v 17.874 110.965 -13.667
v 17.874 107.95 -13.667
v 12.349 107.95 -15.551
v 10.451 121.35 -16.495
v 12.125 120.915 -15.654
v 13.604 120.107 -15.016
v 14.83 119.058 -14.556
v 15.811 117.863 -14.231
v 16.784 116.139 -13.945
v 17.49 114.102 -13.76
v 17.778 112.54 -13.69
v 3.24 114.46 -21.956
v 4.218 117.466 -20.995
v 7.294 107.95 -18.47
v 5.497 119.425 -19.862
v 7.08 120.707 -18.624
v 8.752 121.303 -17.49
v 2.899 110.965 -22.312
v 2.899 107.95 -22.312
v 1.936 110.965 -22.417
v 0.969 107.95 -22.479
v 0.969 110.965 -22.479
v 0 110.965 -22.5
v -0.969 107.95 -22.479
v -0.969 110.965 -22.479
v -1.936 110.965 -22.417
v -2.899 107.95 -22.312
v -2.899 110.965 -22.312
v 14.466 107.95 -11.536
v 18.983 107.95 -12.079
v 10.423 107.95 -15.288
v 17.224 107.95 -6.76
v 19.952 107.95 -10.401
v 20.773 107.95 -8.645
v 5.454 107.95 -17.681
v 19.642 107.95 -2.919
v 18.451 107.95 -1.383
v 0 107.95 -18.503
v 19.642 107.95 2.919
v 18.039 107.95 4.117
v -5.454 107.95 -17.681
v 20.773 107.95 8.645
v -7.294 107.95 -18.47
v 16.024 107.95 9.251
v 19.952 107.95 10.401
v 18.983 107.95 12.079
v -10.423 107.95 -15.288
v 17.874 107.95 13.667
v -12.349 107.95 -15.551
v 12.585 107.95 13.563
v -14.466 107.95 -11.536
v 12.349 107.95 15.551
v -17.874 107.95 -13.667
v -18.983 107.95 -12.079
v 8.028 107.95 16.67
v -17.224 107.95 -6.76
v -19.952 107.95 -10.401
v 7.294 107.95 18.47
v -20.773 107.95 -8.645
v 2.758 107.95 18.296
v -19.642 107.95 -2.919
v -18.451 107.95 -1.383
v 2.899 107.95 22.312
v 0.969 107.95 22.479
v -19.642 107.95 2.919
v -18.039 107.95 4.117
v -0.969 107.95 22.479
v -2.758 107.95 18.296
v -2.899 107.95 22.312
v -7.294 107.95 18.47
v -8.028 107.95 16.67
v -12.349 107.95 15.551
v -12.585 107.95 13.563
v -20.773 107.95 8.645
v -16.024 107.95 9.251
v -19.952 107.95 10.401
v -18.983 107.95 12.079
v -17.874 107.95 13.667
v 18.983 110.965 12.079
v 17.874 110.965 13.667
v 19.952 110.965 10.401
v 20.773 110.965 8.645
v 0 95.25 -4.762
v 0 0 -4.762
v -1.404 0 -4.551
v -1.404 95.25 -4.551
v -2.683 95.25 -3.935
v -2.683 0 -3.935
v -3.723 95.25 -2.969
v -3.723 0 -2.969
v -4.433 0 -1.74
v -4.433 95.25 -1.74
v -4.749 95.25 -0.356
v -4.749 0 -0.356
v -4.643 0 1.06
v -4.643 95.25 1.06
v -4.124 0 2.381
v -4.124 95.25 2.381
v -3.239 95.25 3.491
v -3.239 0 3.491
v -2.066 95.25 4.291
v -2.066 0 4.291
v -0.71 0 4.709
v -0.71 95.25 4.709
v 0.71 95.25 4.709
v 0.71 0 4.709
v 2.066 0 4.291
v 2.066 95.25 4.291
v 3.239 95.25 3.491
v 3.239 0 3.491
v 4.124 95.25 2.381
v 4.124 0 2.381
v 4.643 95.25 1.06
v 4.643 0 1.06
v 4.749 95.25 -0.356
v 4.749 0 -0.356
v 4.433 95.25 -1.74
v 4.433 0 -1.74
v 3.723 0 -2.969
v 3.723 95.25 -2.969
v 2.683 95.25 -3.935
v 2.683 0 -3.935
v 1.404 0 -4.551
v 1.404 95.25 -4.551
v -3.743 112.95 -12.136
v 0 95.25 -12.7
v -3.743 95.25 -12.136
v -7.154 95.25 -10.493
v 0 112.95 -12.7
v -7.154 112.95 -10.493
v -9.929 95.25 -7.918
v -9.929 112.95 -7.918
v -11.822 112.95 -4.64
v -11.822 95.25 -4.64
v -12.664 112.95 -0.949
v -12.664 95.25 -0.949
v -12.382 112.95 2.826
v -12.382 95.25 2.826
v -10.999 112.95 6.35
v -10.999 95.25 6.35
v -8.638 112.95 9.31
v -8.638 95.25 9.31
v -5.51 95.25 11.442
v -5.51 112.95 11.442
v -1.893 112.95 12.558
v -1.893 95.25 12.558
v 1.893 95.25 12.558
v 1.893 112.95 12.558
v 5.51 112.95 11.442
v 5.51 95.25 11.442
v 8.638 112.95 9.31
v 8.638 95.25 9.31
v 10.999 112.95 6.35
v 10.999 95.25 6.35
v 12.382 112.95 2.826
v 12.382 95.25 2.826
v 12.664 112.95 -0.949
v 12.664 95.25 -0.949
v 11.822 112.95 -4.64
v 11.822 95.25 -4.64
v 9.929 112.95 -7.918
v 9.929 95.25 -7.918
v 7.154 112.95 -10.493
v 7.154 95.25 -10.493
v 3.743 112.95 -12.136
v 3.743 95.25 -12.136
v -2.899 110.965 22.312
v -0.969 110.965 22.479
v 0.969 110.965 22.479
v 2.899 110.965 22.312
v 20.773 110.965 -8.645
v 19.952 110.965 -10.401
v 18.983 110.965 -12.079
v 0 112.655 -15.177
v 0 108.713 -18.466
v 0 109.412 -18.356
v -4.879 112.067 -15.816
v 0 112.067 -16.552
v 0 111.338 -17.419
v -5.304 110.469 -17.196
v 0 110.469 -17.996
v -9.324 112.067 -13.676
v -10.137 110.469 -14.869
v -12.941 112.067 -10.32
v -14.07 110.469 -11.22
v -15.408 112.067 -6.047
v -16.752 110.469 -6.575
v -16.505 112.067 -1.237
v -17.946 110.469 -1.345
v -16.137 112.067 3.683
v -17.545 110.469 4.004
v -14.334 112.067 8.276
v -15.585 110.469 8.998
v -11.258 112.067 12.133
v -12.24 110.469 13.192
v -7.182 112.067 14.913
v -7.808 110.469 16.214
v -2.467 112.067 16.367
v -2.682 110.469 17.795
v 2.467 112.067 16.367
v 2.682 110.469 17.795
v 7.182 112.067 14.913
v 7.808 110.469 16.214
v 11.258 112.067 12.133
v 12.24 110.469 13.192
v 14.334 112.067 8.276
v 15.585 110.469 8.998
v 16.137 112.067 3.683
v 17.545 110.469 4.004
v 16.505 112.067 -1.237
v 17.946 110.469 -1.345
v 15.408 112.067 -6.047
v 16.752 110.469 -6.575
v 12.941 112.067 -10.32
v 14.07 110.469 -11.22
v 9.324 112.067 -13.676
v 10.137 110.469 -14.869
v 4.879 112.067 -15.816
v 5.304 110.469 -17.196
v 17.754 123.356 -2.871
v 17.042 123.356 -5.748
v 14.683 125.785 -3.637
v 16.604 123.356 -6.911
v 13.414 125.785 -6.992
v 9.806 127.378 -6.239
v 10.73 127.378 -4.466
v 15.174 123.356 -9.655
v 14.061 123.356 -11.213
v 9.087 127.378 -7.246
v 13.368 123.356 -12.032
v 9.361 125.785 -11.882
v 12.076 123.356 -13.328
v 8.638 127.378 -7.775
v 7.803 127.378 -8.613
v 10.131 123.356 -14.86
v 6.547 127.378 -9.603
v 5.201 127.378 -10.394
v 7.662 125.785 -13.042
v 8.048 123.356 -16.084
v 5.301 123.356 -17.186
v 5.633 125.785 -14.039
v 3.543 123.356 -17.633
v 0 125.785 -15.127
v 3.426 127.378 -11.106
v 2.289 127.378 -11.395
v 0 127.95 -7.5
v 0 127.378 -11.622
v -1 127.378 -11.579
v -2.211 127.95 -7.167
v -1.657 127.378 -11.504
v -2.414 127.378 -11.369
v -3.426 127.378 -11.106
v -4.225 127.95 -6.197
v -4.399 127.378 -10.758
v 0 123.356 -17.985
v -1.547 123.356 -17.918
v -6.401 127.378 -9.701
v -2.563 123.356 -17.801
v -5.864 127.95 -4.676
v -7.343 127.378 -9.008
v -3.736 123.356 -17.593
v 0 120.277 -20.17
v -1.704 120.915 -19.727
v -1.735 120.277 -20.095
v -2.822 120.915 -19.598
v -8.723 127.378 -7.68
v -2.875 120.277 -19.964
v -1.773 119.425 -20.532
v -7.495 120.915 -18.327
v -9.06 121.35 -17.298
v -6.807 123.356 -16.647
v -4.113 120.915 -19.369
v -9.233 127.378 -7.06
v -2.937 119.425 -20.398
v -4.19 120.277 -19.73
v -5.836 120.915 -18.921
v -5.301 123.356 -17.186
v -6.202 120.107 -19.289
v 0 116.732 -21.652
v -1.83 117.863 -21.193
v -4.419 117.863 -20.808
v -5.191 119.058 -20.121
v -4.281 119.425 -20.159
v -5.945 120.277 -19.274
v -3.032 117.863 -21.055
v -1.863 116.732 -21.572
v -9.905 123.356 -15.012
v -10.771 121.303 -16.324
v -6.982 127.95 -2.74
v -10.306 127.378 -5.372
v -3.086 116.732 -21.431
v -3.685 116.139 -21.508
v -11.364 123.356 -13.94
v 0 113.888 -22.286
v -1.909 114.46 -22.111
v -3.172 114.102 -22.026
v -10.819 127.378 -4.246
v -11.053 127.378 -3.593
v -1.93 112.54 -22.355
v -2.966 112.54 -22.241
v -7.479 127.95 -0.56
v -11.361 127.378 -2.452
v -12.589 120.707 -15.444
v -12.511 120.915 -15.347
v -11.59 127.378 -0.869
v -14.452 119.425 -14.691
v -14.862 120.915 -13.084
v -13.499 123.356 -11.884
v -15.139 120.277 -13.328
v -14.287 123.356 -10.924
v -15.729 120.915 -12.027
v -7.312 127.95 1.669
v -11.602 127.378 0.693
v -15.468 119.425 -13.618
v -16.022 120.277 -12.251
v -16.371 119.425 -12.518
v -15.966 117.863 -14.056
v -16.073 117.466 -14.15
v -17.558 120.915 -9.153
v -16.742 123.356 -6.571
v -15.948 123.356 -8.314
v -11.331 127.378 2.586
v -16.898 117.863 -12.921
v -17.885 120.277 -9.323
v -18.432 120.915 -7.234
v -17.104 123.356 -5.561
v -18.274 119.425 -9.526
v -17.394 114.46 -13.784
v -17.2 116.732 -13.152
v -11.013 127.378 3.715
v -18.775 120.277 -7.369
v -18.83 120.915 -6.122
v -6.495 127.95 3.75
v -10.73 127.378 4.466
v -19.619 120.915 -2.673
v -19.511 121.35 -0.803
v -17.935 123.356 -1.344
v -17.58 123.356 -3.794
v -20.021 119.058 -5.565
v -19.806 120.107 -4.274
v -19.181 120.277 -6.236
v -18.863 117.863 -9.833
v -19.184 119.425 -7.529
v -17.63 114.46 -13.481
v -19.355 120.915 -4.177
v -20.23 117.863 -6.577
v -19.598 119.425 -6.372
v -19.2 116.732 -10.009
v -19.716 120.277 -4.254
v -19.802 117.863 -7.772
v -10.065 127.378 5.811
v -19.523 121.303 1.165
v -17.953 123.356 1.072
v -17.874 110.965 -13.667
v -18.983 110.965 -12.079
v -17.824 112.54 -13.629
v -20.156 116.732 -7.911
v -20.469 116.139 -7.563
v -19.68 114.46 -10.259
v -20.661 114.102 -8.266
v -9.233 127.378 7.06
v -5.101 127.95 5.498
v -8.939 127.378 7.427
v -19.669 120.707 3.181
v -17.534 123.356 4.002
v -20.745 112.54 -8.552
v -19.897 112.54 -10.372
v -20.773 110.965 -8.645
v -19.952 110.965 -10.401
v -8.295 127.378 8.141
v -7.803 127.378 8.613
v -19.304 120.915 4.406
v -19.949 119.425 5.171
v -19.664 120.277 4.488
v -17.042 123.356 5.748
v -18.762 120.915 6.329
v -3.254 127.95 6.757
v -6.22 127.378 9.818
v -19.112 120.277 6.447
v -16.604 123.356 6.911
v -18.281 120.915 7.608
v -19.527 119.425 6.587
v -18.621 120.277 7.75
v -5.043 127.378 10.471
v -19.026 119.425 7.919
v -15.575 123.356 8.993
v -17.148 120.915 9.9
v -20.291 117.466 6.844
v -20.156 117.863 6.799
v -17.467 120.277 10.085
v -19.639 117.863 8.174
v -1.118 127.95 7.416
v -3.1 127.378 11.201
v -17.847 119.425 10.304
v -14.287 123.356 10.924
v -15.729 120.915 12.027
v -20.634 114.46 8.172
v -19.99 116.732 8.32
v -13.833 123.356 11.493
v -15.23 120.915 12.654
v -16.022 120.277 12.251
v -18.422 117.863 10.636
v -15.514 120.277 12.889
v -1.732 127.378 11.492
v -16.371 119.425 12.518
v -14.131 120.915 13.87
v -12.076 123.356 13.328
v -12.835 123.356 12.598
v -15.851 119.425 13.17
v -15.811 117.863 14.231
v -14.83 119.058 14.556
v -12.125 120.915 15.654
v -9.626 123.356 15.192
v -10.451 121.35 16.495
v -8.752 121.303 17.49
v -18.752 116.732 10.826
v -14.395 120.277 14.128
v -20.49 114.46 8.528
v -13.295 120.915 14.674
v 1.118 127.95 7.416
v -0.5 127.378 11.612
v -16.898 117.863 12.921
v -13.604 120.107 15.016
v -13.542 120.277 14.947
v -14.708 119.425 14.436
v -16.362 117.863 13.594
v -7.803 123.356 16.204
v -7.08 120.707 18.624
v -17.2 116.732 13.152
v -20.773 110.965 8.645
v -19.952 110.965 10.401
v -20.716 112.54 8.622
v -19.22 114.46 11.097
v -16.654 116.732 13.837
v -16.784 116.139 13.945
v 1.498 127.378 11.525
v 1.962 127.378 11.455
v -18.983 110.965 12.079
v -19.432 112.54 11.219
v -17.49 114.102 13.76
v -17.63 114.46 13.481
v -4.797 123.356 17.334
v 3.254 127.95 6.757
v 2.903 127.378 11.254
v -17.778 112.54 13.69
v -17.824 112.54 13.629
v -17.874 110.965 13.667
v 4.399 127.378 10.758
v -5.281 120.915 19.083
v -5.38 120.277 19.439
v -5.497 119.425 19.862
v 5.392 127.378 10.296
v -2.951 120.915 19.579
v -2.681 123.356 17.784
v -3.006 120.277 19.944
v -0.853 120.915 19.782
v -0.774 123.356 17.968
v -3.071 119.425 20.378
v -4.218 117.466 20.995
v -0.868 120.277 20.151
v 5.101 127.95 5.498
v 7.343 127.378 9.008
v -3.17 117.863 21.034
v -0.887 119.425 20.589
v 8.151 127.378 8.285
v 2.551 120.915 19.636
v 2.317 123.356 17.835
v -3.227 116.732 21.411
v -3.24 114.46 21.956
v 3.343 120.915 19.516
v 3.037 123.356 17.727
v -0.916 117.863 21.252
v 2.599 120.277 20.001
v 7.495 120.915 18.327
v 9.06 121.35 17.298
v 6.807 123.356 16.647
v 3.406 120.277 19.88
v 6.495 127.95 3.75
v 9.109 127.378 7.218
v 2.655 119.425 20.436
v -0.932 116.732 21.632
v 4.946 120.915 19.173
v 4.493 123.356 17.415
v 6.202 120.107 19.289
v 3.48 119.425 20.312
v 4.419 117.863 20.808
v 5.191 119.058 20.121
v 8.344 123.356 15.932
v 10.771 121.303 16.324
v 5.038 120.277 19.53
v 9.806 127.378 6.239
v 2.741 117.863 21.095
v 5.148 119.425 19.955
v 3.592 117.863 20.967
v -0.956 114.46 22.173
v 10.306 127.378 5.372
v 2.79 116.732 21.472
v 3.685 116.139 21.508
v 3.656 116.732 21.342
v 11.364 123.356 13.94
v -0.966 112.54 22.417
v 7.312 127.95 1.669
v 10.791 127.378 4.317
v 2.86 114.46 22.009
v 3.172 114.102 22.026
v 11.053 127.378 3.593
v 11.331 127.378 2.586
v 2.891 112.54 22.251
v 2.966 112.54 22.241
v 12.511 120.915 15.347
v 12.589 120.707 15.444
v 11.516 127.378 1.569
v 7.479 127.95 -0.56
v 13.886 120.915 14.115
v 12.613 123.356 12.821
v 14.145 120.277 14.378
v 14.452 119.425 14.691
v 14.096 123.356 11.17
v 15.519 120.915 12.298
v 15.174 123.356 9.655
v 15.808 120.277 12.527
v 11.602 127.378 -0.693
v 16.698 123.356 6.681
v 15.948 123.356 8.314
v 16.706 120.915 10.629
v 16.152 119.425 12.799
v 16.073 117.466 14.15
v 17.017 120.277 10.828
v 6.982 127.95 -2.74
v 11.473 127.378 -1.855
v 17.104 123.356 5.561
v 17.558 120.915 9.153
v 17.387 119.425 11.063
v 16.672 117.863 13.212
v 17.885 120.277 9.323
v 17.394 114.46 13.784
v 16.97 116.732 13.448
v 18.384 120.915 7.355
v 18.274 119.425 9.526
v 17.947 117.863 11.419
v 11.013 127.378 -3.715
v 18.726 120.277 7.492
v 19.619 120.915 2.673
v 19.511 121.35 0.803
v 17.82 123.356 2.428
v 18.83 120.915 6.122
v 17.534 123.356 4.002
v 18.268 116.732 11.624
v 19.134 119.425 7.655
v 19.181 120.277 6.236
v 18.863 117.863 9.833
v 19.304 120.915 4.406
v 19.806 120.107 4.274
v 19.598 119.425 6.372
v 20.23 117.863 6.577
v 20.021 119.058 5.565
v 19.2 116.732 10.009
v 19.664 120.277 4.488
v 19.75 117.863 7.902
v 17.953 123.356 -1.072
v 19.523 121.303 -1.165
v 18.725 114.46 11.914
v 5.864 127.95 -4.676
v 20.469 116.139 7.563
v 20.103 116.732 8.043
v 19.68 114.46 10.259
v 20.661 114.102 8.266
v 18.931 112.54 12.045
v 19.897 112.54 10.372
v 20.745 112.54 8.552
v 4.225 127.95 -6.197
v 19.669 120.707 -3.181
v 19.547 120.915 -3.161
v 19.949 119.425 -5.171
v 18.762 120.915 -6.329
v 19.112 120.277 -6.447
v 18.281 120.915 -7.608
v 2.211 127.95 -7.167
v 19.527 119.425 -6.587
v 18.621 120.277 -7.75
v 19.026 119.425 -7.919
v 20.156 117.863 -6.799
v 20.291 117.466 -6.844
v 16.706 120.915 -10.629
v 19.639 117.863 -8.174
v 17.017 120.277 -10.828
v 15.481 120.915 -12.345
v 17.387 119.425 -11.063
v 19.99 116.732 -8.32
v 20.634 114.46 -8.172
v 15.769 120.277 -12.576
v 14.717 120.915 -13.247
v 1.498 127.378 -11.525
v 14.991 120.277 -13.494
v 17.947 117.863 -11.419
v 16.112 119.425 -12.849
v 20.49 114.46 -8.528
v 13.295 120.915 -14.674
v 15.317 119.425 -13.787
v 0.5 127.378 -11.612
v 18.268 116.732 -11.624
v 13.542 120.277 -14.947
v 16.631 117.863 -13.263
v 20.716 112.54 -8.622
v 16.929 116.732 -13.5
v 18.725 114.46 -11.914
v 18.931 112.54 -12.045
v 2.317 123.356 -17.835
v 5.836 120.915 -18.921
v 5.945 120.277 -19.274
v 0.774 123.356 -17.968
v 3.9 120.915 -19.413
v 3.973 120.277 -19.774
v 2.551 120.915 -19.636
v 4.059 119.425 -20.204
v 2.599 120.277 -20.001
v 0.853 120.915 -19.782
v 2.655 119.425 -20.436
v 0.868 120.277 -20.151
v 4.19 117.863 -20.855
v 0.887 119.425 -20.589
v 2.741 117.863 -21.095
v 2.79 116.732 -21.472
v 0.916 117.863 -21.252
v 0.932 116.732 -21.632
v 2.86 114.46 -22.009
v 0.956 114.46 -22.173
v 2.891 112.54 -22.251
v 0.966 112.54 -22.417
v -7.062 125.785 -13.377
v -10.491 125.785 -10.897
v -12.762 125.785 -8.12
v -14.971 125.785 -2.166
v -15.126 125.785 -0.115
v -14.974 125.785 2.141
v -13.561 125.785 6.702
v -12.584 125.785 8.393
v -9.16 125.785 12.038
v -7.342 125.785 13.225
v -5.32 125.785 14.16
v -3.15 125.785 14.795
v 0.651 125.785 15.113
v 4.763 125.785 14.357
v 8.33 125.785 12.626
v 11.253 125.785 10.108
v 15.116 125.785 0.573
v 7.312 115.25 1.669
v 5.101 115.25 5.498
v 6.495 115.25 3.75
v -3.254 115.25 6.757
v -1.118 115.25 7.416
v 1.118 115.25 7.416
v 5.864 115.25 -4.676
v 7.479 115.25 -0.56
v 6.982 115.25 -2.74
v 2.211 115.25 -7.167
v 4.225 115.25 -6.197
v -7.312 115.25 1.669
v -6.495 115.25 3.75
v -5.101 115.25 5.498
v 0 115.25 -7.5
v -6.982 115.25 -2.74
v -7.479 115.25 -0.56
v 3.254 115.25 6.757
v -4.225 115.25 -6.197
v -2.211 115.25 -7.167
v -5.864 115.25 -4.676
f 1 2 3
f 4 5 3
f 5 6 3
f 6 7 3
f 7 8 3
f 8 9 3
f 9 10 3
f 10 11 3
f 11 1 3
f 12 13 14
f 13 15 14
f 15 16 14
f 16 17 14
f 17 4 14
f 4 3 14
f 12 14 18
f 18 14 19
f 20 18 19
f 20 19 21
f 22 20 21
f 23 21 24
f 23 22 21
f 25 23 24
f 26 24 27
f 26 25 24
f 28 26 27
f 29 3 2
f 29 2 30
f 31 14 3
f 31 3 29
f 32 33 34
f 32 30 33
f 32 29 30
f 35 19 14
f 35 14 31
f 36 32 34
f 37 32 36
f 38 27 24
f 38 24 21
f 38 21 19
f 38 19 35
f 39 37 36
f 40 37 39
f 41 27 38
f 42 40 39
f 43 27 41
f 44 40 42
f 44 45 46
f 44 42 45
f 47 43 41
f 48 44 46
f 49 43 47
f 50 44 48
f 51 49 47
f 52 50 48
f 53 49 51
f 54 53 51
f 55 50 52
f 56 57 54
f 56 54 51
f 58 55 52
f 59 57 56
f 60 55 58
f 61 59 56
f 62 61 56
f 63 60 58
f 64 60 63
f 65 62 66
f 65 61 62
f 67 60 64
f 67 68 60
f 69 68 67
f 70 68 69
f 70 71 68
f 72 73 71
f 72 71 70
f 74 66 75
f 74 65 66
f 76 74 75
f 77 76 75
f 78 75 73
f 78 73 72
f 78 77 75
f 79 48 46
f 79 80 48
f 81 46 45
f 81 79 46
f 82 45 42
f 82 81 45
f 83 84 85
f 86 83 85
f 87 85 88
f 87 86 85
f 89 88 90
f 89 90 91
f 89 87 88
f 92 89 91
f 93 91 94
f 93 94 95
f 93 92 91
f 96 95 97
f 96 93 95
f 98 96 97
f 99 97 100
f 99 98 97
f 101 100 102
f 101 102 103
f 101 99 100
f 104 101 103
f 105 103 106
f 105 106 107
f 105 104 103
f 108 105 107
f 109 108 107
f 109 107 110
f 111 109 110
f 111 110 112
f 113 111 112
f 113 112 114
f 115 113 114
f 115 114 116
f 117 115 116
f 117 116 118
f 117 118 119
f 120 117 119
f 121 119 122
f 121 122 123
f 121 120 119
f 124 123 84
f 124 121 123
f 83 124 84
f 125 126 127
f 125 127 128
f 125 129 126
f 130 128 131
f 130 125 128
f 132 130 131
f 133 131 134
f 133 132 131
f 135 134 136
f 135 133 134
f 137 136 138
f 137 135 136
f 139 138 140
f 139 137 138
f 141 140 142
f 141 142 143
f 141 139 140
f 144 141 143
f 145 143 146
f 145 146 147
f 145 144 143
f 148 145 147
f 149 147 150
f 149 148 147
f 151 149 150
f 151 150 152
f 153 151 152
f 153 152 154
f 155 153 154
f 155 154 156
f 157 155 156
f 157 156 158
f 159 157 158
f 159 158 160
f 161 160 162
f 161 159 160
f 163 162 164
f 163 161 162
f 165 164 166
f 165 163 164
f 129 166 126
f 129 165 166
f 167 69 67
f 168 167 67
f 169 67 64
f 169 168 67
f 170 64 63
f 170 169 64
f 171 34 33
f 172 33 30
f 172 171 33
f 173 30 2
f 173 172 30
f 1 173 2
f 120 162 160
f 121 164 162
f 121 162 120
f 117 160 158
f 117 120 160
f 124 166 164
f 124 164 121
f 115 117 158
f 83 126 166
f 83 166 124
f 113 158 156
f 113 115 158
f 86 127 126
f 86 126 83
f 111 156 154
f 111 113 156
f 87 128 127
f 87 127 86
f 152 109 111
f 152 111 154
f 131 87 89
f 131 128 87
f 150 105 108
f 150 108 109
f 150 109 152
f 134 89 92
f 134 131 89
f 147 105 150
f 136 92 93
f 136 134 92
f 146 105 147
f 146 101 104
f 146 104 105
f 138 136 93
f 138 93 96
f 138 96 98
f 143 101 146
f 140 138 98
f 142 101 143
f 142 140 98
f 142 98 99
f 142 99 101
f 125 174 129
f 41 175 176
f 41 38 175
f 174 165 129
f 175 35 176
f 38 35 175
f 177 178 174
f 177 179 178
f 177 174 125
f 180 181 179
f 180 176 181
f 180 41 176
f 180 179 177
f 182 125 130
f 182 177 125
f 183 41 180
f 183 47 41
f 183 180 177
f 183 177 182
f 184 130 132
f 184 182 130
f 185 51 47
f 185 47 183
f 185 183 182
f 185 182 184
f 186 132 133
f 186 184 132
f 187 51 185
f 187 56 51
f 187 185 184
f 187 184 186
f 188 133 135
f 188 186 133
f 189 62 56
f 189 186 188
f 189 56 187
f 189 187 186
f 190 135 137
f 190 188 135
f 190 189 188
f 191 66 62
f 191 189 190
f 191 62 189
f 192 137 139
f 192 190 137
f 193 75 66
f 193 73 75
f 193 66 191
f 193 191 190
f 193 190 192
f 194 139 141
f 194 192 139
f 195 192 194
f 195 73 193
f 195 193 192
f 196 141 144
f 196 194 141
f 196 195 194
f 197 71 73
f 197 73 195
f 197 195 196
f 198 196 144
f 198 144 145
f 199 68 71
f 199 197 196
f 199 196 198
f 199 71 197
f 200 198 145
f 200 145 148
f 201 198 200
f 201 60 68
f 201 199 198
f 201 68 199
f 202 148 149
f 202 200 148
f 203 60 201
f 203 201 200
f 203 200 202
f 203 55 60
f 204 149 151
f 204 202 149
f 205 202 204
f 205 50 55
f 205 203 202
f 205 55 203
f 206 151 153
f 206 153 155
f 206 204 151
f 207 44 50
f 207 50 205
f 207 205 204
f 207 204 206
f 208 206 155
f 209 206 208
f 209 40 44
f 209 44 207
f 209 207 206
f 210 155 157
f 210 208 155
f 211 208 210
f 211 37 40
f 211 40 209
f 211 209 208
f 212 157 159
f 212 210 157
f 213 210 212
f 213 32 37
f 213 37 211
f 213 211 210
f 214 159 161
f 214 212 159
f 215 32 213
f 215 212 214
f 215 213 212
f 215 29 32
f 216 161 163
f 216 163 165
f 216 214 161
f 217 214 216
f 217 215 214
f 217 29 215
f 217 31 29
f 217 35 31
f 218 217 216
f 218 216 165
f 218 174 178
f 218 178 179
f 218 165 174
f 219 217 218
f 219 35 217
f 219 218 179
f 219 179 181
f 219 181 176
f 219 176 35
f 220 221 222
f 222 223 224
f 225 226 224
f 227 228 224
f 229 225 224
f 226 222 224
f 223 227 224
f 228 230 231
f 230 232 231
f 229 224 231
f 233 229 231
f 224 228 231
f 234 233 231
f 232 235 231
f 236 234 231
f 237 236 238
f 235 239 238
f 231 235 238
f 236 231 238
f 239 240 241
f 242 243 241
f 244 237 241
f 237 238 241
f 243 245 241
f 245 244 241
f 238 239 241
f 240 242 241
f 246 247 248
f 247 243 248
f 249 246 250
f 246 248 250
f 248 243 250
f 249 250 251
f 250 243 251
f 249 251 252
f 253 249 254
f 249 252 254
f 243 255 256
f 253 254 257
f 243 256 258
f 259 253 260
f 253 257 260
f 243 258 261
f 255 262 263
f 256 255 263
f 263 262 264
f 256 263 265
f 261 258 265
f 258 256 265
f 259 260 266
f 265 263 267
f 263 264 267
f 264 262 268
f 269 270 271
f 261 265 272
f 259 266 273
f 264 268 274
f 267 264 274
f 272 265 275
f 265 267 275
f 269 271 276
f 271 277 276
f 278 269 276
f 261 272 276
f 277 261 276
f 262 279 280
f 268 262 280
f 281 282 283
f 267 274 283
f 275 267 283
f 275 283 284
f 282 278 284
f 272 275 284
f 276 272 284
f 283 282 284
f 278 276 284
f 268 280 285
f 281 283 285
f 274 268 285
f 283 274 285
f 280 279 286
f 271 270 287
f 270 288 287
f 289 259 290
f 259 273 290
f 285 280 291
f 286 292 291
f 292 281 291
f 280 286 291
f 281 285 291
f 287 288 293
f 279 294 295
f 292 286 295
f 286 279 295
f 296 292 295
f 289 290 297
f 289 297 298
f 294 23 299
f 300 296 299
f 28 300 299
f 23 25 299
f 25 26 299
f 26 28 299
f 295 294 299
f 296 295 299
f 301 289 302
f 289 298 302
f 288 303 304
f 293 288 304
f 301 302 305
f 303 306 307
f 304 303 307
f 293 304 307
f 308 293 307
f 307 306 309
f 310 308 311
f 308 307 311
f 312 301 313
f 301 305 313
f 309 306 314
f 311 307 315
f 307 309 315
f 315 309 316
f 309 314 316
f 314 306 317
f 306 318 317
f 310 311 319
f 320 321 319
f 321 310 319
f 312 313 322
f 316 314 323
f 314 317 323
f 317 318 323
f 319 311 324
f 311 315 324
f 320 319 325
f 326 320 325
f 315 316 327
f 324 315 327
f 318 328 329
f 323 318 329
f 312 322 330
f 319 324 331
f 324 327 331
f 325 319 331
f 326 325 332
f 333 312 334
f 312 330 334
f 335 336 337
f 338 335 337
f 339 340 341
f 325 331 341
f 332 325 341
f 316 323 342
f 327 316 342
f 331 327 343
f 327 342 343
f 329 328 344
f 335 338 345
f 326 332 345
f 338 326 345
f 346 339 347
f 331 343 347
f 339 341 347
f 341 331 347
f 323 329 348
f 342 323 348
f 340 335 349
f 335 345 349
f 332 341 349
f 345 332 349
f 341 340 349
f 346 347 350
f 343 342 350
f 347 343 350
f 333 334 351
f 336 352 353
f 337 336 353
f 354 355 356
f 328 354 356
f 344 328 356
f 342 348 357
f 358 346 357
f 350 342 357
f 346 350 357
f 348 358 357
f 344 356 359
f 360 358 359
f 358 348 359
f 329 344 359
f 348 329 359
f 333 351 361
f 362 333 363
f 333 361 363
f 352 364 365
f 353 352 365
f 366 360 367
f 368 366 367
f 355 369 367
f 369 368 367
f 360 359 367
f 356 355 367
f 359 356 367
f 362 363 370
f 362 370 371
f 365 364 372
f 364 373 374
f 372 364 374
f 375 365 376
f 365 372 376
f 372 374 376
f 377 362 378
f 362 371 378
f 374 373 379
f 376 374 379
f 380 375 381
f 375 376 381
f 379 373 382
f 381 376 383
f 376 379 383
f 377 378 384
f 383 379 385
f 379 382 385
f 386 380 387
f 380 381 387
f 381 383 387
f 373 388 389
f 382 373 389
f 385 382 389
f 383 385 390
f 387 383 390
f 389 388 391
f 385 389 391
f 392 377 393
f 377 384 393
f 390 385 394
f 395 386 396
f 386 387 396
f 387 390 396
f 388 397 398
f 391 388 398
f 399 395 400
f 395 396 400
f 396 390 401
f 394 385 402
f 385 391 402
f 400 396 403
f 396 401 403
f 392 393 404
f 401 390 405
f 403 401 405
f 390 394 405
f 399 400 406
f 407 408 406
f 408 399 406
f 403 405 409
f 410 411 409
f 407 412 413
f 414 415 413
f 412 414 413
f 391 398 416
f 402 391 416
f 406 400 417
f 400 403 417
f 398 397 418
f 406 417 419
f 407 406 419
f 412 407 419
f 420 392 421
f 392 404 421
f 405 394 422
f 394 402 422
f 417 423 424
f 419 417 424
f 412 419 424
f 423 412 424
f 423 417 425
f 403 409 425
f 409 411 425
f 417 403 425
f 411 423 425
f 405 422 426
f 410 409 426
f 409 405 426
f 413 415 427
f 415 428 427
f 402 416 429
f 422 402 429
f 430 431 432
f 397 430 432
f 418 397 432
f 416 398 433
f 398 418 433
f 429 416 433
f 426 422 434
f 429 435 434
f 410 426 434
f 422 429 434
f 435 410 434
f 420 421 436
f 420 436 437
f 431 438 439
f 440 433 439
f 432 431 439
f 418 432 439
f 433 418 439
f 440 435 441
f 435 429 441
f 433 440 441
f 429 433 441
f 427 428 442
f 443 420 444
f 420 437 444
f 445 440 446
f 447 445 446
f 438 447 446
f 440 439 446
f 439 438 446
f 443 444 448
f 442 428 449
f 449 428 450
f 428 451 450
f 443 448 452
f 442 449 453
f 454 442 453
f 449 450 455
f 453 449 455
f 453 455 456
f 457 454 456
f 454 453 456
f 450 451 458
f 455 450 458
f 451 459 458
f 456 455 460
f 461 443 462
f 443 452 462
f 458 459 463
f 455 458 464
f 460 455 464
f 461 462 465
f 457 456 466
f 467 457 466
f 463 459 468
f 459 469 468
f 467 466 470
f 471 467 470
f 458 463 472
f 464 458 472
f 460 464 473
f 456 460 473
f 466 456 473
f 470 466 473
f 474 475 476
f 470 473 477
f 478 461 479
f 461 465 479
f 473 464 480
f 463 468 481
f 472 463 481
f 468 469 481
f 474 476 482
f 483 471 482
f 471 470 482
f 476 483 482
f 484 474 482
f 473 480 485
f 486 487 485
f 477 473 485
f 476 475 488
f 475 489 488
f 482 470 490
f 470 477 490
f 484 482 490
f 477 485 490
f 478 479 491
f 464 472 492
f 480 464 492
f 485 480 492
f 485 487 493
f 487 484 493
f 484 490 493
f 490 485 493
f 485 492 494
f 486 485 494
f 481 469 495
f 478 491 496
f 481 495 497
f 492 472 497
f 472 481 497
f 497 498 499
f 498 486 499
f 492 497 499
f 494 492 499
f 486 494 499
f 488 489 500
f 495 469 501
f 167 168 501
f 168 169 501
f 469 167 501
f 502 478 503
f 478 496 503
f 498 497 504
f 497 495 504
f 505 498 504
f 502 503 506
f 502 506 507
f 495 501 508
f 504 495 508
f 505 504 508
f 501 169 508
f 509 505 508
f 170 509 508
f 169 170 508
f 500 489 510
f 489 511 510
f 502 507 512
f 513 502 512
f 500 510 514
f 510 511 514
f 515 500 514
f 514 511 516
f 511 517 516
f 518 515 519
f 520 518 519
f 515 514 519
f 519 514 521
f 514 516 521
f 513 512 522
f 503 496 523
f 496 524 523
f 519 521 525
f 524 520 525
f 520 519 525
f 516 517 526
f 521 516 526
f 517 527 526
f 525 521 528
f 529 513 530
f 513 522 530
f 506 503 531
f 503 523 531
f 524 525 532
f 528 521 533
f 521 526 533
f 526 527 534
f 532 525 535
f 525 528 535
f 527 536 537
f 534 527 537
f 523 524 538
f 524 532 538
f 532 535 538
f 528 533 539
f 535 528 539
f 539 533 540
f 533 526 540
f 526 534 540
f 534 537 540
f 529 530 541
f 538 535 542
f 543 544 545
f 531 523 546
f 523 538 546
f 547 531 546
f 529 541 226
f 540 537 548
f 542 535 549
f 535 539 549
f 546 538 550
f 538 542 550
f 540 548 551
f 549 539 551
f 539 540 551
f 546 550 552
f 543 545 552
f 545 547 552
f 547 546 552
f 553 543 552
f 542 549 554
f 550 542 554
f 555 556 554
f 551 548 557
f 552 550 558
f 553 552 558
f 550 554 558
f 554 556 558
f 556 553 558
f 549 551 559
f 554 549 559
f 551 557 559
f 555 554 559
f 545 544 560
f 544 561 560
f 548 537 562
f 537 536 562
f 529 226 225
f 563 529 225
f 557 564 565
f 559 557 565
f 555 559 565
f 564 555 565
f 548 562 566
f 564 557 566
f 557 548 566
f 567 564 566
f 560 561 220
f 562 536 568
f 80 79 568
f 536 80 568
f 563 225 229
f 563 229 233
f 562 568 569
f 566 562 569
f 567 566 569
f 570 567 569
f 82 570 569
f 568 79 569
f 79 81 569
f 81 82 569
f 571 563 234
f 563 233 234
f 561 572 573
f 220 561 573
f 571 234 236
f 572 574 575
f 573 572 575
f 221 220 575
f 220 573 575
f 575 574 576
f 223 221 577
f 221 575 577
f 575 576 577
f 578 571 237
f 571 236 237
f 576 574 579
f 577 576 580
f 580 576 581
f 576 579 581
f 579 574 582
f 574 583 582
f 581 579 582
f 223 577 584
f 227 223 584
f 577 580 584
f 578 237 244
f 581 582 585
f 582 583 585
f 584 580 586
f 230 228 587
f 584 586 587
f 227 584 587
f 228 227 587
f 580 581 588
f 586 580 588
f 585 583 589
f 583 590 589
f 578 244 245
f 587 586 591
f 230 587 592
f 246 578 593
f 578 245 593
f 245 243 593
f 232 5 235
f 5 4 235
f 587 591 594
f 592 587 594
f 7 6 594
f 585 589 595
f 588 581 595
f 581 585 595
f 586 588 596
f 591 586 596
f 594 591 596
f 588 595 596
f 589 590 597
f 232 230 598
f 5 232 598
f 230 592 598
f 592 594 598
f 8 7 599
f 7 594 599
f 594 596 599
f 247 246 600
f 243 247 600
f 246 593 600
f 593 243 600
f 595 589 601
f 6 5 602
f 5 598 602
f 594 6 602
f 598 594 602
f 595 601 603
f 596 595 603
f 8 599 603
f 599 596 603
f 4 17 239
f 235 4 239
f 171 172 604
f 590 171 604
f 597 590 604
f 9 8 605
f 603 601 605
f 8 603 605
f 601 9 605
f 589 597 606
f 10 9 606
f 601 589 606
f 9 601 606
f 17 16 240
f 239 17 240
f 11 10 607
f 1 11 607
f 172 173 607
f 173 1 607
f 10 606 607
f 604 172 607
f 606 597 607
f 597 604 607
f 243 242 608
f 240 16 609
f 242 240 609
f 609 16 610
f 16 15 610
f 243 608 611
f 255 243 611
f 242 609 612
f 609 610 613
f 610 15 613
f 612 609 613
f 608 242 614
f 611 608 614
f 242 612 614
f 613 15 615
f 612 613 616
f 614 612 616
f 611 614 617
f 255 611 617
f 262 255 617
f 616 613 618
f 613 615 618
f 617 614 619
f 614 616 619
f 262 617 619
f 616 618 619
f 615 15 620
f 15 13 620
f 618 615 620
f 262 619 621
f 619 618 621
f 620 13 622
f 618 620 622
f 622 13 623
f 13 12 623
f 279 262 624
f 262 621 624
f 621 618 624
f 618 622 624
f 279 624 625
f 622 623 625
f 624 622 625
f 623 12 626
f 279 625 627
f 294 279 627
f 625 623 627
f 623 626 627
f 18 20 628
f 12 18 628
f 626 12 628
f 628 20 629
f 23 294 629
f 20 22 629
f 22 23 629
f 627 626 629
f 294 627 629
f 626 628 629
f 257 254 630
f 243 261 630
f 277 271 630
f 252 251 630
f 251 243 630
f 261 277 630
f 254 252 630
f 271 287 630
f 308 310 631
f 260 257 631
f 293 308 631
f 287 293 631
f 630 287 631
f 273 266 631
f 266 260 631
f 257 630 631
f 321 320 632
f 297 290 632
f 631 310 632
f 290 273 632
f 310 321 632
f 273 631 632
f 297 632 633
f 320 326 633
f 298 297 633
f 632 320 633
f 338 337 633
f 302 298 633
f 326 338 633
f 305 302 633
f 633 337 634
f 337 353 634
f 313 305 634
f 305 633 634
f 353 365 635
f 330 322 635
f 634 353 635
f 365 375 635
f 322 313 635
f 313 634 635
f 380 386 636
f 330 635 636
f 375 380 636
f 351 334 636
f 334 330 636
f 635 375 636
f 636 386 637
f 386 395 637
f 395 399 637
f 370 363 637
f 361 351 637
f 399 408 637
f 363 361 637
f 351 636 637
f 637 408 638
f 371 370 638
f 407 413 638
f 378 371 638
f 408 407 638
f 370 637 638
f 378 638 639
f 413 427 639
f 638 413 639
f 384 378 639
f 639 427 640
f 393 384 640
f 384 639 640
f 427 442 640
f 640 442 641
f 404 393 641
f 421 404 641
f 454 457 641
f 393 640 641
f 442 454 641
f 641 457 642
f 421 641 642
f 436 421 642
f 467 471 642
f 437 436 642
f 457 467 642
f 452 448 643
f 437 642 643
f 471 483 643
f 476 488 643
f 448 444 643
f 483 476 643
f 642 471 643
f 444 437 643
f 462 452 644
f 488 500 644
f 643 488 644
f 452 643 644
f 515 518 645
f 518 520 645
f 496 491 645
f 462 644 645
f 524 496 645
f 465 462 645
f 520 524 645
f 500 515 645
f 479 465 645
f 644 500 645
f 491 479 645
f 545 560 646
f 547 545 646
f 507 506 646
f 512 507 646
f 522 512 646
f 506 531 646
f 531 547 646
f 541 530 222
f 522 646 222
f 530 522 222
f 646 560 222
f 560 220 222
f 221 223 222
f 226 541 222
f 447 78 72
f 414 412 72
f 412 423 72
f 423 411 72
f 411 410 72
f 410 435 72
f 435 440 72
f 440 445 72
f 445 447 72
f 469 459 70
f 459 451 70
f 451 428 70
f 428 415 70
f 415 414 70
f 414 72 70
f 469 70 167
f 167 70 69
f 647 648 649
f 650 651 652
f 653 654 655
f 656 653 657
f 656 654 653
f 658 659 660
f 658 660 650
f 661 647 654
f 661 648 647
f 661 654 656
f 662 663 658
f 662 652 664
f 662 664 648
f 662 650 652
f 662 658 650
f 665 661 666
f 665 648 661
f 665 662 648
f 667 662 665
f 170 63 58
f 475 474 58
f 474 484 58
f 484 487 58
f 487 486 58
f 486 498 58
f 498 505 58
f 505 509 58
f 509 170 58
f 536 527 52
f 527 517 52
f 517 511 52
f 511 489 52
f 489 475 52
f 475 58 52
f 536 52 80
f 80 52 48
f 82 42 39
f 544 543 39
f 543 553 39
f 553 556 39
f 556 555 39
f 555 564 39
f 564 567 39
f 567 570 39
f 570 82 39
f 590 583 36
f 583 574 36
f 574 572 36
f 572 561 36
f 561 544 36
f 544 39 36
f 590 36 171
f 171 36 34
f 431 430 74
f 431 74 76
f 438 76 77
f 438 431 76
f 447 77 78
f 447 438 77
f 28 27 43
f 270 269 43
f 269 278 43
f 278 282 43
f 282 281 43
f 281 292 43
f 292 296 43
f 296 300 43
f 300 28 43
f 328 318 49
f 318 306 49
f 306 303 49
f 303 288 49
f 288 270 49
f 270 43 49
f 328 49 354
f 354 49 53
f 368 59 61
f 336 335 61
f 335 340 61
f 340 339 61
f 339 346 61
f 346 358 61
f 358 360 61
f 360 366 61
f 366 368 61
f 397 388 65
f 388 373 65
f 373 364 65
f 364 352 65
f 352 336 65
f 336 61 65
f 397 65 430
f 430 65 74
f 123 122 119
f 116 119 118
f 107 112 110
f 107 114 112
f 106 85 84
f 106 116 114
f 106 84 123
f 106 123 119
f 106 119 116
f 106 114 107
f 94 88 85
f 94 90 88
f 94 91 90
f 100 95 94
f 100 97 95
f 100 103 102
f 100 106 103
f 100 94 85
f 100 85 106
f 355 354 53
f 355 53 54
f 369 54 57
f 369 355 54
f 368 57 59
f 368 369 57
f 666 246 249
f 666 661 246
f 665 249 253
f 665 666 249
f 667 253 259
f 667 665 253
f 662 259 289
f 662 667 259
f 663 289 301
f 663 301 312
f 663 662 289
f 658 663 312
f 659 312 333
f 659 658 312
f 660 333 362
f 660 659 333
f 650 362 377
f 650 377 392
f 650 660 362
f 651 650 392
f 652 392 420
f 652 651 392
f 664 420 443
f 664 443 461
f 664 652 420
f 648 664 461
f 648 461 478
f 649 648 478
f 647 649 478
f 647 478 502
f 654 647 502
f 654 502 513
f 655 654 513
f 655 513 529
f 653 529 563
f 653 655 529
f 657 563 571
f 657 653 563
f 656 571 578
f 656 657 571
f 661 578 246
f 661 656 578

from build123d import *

# Parameters (mm, degrees)
CORTAR_EXTRUIR1_DEPTH = 113.54200331


with BuildPart() as part:
    # Croquis2 → Revolución1 (revolve)
    with BuildSketch(Plane.XY, mode=Mode.PRIVATE) as revoluci_n1_sk:
        with BuildLine():
            Line((4.7625, 95.25), (12.7, 95.25))
            Line((12.7, 95.25), (12.7, 112.95))
            add(Edge.make_bspline(
                [(12.7, 112.95), (18.502741551, 112.95), (18.502741551, 107.95)],
                knots=[0, 0, 0, 1, 1, 1], degree=2))
            Line((18.502741551, 107.95), (22.5, 107.95))
            Line((22.5, 107.95), (22.5, 110.964889394))
            add(Edge.make_bspline(
                [(7.5, 127.95), (17.074954072, 127.95), (22.5, 119.467155594), (22.5, 110.964889394)],
                knots=[0, 0, 0, 0, 1, 1, 1, 1], degree=3))
            Line((7.5, 127.95), (7.5, 115.25))
            Line((7.5, 115.25), (0, 115.25))
            Line((0, 115.25), (0, 0))
            Line((0, 0), (4.7625, 0))
            Line((4.7625, 0), (4.7625, 95.25))
        make_face()
    revolve(revoluci_n1_sk.sketch.rotate(Axis((0, 0, 0), (0, 1, 0)), 90), axis=Axis((0, 0, 0), (0, 1, 0)))

    # Croquis3 → Cortar-Extruir1 (cut, through all)
    with BuildSketch(Plane.XZ.offset(-107.95)):
        with BuildLine():
            ThreePointArc((20.772727273, 8.645449766), (19.5, 0), (20.772727273, -8.645449766))
            ThreePointArc((20.772727273, -8.645449766), (22.5, 0), (20.772727273, 8.645449766))
        make_face()
        with BuildLine():
            ThreePointArc((17.873542761, -13.666984641), (9.75, -16.887495374), (2.899184512, -22.312434407))
            ThreePointArc((2.899184512, -22.312434407), (11.25, -19.485571585), (17.873542761, -13.666984641))
        make_face()
        with BuildLine():
            ThreePointArc((-2.899184512, -22.312434407), (-9.75, -16.887495374), (-17.873542761, -13.666984641))
            ThreePointArc((-17.873542761, -13.666984641), (-11.25, -19.485571585), (-2.899184512, -22.312434407))
        make_face()
        with BuildLine():
            ThreePointArc((-20.772727273, -8.645449766), (-19.5, 0), (-20.772727273, 8.645449766))
            ThreePointArc((-20.772727273, 8.645449766), (-22.5, 0), (-20.772727273, -8.645449766))
        make_face()
        with BuildLine():
            ThreePointArc((-17.873542761, 13.666984641), (-9.75, 16.887495374), (-2.899184512, 22.312434407))
            ThreePointArc((-2.899184512, 22.312434407), (-11.25, 19.485571585), (-17.873542761, 13.666984641))
        make_face()
        with BuildLine():
            ThreePointArc((2.899184512, 22.312434407), (9.75, 16.887495374), (17.873542761, 13.666984641))
            ThreePointArc((17.873542761, 13.666984641), (11.25, 19.485571585), (2.899184512, 22.312434407))
        make_face()
    extrude(amount=-CORTAR_EXTRUIR1_DEPTH, mode=Mode.SUBTRACT)


solid = part.part
